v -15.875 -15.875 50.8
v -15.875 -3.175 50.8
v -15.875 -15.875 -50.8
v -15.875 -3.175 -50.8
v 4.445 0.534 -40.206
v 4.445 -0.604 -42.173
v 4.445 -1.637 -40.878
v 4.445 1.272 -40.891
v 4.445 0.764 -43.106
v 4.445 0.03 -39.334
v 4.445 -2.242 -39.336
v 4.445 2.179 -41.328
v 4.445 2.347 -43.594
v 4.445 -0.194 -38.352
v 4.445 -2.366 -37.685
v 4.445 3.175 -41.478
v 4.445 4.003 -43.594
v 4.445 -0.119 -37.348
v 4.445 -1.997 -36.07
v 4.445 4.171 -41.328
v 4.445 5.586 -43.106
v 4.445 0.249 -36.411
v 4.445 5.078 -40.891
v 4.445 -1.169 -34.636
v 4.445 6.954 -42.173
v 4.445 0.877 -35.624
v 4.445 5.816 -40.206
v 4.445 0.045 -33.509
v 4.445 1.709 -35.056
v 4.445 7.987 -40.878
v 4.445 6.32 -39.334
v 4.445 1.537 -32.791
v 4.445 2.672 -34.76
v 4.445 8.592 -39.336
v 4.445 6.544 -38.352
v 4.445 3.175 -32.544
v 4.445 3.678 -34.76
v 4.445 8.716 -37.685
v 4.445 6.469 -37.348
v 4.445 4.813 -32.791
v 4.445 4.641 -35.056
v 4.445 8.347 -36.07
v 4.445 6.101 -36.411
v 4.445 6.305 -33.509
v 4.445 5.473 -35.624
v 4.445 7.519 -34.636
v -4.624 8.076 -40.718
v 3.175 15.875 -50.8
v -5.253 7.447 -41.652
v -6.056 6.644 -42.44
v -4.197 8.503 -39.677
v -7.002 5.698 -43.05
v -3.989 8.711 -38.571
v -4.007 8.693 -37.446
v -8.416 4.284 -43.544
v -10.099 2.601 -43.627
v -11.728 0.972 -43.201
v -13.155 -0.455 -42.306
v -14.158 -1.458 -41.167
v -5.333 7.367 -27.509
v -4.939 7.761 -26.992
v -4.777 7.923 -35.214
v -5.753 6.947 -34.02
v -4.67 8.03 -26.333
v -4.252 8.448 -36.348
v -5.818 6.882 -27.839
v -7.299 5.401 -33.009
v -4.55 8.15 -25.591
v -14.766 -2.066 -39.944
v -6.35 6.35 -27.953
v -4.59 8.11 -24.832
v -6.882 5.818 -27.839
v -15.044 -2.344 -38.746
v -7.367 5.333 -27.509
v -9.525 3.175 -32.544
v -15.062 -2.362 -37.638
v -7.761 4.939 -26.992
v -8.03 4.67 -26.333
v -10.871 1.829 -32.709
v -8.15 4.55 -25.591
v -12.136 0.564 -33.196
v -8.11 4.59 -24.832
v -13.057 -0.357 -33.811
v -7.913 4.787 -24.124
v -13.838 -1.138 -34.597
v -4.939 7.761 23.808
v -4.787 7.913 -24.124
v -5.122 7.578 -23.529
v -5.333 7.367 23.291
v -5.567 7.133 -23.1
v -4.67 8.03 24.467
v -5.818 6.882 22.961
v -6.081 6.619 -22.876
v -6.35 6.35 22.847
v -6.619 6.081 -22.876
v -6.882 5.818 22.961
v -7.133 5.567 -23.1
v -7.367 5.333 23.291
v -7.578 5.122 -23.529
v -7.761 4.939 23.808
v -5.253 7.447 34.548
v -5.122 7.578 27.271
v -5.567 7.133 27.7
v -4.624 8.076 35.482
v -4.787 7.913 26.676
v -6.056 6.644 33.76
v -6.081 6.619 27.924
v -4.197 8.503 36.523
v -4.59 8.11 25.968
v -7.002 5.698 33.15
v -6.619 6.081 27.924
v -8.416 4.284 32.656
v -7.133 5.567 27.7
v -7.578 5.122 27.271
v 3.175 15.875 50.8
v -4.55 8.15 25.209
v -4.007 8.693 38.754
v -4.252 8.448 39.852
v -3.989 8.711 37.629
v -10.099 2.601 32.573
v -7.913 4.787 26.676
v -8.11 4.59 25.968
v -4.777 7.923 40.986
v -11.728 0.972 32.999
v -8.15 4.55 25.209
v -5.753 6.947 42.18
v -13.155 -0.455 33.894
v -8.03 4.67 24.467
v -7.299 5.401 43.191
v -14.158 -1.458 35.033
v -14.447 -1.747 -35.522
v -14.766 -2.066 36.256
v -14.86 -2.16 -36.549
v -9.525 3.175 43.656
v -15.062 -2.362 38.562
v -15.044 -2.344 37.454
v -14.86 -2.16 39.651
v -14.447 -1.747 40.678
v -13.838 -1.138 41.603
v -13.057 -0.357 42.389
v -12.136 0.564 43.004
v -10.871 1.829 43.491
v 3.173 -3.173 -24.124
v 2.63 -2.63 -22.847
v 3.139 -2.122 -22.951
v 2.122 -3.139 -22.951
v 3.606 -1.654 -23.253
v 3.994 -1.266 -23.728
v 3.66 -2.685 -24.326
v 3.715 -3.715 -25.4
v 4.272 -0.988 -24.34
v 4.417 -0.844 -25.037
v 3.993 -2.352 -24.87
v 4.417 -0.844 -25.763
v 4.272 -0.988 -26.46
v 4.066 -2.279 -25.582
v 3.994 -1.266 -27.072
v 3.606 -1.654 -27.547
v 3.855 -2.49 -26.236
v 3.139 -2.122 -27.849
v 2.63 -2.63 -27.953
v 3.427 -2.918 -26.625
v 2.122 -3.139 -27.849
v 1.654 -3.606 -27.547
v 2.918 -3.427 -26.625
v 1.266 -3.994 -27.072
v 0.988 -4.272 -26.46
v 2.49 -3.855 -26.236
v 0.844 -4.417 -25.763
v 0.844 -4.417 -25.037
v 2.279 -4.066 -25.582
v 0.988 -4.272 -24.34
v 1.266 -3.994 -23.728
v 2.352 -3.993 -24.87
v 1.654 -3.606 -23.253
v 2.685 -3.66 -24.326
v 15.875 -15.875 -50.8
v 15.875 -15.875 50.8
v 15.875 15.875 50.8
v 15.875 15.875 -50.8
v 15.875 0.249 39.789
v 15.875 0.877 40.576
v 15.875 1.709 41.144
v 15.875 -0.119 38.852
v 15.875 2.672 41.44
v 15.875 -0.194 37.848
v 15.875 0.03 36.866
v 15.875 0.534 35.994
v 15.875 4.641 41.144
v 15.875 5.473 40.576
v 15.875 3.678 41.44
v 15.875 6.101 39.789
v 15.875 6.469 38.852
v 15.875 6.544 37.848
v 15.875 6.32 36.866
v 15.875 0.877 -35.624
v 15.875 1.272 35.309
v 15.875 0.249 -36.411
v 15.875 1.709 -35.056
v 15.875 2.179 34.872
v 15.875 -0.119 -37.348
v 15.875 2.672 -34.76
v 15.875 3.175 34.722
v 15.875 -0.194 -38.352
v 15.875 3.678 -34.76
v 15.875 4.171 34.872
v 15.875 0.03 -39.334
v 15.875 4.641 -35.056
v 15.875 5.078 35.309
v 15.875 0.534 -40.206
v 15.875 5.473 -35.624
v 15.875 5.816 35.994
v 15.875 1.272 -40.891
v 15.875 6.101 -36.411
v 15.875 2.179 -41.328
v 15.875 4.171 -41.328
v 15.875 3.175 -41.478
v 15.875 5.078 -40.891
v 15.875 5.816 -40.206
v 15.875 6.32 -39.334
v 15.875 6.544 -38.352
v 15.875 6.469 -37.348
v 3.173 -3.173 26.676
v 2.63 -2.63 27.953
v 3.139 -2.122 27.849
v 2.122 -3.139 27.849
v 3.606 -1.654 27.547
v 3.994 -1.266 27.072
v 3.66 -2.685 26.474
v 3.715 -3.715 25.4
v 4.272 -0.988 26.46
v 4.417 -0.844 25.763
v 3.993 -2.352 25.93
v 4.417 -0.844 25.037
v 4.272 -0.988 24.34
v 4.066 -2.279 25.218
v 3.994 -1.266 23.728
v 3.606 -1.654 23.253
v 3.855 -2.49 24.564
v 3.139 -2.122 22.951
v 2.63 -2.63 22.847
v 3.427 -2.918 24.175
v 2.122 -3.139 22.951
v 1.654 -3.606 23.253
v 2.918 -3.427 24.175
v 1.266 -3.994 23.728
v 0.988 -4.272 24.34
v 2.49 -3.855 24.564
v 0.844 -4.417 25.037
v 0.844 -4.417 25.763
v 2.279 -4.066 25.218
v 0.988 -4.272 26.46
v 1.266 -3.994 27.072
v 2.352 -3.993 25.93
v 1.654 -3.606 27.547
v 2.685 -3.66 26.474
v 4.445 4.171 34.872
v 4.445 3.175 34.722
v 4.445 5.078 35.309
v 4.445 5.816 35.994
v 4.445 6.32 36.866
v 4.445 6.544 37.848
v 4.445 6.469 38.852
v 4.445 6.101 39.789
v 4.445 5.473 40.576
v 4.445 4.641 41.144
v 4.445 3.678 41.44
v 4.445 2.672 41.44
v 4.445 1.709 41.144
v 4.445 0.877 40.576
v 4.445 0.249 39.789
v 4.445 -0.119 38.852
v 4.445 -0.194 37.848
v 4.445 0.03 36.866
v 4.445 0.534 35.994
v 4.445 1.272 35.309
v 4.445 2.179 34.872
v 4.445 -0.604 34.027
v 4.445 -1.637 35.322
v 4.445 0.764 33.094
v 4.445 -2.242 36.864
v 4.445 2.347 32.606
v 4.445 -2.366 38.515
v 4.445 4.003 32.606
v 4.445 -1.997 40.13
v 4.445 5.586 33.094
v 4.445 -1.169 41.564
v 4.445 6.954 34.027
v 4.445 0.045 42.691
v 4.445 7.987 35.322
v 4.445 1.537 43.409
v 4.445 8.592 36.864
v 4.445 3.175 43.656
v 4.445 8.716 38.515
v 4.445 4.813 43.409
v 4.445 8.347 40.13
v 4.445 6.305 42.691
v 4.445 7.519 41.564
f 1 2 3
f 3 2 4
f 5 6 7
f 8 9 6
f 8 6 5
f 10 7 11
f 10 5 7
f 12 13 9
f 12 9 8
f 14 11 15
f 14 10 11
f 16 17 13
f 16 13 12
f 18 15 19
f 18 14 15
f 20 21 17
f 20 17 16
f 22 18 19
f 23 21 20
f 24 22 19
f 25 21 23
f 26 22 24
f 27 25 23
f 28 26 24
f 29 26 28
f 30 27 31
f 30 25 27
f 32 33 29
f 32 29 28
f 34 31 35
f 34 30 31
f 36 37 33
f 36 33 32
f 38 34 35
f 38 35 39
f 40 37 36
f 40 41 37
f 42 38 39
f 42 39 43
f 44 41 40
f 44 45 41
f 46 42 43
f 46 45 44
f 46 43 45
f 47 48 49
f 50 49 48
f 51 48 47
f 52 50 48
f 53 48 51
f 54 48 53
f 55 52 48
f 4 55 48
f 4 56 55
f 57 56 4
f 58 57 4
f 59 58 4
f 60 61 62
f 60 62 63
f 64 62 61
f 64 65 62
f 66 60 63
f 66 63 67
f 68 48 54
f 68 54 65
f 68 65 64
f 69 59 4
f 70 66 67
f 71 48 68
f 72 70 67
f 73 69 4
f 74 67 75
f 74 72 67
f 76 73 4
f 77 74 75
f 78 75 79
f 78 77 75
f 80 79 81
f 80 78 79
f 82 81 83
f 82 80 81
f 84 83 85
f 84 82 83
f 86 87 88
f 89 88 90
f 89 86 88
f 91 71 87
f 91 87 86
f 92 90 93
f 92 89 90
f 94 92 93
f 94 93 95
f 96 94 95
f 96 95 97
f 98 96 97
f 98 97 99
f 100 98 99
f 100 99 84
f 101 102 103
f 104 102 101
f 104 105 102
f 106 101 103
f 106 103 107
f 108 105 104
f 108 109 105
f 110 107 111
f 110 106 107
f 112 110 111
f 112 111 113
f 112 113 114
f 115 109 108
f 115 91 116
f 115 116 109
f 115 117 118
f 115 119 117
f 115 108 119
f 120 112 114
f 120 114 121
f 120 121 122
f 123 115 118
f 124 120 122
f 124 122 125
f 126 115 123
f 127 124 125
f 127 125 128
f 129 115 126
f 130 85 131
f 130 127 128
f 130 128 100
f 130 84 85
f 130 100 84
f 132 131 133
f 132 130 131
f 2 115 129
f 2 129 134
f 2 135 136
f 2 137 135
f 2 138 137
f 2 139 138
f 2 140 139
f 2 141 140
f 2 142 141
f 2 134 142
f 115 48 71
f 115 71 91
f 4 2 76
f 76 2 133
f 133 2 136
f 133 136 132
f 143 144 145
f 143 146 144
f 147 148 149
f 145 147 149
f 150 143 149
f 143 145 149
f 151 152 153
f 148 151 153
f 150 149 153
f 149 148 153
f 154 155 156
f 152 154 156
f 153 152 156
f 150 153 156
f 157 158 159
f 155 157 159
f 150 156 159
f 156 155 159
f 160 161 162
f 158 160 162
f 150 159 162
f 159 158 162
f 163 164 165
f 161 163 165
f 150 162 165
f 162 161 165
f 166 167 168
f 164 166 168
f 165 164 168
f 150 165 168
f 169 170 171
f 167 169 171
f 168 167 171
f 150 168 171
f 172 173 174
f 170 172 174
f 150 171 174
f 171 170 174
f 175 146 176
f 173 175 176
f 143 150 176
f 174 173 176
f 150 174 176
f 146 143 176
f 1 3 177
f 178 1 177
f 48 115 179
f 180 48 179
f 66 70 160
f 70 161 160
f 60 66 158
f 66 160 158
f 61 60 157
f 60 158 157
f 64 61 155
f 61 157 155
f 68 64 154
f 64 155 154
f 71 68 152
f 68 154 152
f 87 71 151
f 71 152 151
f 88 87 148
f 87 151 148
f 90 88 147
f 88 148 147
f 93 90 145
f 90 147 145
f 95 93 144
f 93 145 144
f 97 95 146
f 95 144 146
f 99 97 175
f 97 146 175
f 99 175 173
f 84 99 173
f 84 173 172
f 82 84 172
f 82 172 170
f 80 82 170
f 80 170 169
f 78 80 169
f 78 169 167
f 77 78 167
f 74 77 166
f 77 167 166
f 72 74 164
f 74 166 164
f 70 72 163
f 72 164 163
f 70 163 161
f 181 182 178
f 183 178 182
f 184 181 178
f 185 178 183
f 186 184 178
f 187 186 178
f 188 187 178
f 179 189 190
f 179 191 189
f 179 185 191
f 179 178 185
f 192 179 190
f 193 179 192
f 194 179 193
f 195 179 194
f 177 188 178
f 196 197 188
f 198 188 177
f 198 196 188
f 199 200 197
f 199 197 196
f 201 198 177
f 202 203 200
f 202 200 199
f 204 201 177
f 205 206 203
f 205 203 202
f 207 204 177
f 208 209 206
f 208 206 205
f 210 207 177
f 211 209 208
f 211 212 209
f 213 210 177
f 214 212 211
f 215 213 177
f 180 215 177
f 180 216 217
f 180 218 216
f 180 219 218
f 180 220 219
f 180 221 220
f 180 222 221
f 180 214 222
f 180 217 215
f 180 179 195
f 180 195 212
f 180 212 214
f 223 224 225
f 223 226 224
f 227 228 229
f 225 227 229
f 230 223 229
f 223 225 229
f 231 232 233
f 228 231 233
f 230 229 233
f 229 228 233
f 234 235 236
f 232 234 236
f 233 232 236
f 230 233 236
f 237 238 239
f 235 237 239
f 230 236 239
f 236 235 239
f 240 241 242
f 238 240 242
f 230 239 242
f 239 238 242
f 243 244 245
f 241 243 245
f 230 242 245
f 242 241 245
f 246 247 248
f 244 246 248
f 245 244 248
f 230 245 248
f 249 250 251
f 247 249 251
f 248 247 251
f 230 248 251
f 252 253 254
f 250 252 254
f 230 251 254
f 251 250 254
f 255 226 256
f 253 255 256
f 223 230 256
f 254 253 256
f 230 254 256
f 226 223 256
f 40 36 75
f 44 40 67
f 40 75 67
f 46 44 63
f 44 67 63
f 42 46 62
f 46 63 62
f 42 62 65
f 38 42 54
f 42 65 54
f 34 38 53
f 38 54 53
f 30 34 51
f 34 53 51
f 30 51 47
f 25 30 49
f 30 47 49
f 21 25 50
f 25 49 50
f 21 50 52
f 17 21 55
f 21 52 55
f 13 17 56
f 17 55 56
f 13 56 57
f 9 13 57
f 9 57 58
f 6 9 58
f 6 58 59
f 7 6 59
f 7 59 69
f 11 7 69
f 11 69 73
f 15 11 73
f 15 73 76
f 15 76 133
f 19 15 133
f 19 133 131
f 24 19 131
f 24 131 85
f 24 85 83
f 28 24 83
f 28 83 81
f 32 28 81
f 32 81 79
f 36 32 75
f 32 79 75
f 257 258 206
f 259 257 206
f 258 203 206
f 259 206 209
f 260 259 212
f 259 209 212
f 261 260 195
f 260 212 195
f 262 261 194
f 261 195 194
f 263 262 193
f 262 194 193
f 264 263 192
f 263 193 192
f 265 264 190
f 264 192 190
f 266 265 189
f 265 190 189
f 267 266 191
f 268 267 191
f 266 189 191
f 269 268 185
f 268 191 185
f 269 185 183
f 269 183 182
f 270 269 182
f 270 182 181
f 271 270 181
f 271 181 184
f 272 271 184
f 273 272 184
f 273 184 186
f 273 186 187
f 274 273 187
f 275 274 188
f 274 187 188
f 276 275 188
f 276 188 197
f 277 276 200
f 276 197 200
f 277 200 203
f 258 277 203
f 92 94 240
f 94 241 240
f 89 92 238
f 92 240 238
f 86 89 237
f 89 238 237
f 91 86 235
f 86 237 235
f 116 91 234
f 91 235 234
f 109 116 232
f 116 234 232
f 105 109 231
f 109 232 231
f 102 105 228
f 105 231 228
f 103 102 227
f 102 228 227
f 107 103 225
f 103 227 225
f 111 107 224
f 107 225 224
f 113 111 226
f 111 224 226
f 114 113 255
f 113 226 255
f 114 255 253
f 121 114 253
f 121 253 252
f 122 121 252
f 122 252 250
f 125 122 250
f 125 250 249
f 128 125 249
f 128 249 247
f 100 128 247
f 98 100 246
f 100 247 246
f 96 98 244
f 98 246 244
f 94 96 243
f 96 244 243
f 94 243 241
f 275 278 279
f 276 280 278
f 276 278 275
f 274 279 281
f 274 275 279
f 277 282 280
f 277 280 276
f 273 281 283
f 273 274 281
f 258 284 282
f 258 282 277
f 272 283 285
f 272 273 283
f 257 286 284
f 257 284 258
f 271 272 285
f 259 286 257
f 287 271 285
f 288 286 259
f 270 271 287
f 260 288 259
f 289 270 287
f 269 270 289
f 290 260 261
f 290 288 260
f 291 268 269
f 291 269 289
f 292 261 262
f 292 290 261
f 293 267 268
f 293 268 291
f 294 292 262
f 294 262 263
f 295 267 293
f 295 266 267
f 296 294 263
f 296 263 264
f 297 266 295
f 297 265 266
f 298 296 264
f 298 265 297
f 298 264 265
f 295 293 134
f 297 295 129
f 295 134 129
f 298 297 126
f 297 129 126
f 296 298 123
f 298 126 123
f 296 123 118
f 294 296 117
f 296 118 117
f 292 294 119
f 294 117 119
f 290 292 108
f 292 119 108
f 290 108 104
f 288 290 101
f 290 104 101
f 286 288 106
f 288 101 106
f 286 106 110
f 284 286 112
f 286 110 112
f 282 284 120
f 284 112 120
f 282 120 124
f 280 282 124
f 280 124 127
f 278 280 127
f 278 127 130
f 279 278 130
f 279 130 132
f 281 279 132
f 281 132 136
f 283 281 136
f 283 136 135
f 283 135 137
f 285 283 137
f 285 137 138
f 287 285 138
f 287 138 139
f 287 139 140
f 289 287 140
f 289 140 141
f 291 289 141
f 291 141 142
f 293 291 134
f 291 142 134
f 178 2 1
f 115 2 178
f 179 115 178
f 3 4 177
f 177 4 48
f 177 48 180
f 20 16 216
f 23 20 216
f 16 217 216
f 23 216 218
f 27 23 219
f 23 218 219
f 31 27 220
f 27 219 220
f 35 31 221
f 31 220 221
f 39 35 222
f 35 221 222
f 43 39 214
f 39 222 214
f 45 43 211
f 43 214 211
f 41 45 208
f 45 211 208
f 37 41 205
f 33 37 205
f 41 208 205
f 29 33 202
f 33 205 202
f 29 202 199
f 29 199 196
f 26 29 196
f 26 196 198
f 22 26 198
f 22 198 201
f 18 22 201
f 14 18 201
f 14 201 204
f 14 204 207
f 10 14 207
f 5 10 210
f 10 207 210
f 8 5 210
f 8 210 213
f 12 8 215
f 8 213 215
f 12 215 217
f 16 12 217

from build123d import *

# Parameters (mm, degrees)
SKETCH1_W                                        = 31.75
SKETCH1_H                                        = 101.6
BOSS_EXTRUDE1_DEPTH                              = 15.875
CUT_EXTRUDE1_REACH                               = 106.051
F_1_4_20_TAPPED_HOLE1_D                          = 5.1054
F_1_4_20_TAPPED_HOLE1_DEPTH                      = 12.7
F_1_4_20_TAPPED_HOLE1_TIP                        = 1.533816902
CBORE_FOR_1_4_SOCKET_HEAD_CAP_SCREW1_D           = 6.7564
CBORE_FOR_1_4_SOCKET_HEAD_CAP_SCREW1_CBORE_D     = 11.1125
CBORE_FOR_1_4_SOCKET_HEAD_CAP_SCREW1_CBORE_DEPTH = 20.32


with BuildPart() as part:
    # Sketch1 → Boss-Extrude1 (new, symmetric)
    with BuildSketch(Plane(origin=(0, 0, 0), x_dir=(1, 0, 0), z_dir=(0, 1, 0))):
        Rectangle(SKETCH1_W, SKETCH1_H)
    extrude(amount=BOSS_EXTRUDE1_DEPTH, both=True)

    # Sketch2 → Cut-Extrude1 (cut, up to next)
    with BuildSketch(Plane.XY.offset(50.8), mode=Mode.PRIVATE) as cut_extrude1_sk1:
        Polygon((-15.875, -3.175), (-15.875, 15.875), (3.175, 15.875), align=None)
    cut_extrude1_tool1 = extrude(cut_extrude1_sk1.sketch, amount=-CUT_EXTRUDE1_REACH, mode=Mode.PRIVATE) & part.part
    add(cut_extrude1_tool1.solids().sort_by_distance((-9.525, 9.525, 50.8))[0], mode=Mode.SUBTRACT)

    # 1/4-20 Tapped Hole1
    with Locations(Plane(origin=(-6.35, 6.35, 0), x_dir=(0, 0, 1), z_dir=(-0.7071067811865513, 0.7071067811865438, 0))):
        with Locations((-25.4, 0), (25.4, 0)):
            Hole(F_1_4_20_TAPPED_HOLE1_D / 2, depth=F_1_4_20_TAPPED_HOLE1_DEPTH)
            with Locations((0, 0, -(F_1_4_20_TAPPED_HOLE1_DEPTH + F_1_4_20_TAPPED_HOLE1_TIP / 2))):  # 118° drill point
                Cone(0, F_1_4_20_TAPPED_HOLE1_D / 2, F_1_4_20_TAPPED_HOLE1_TIP, mode=Mode.SUBTRACT)

    # CBORE for 1/4 Socket Head Cap Screw1 (through all)
    with Locations(Plane.ZY.offset(15.875)):
        with Locations((-38.1, 3.175), (38.1, 3.175)):
            CounterBoreHole(CBORE_FOR_1_4_SOCKET_HEAD_CAP_SCREW1_D / 2, CBORE_FOR_1_4_SOCKET_HEAD_CAP_SCREW1_CBORE_D / 2, CBORE_FOR_1_4_SOCKET_HEAD_CAP_SCREW1_CBORE_DEPTH)


solid = part.part
